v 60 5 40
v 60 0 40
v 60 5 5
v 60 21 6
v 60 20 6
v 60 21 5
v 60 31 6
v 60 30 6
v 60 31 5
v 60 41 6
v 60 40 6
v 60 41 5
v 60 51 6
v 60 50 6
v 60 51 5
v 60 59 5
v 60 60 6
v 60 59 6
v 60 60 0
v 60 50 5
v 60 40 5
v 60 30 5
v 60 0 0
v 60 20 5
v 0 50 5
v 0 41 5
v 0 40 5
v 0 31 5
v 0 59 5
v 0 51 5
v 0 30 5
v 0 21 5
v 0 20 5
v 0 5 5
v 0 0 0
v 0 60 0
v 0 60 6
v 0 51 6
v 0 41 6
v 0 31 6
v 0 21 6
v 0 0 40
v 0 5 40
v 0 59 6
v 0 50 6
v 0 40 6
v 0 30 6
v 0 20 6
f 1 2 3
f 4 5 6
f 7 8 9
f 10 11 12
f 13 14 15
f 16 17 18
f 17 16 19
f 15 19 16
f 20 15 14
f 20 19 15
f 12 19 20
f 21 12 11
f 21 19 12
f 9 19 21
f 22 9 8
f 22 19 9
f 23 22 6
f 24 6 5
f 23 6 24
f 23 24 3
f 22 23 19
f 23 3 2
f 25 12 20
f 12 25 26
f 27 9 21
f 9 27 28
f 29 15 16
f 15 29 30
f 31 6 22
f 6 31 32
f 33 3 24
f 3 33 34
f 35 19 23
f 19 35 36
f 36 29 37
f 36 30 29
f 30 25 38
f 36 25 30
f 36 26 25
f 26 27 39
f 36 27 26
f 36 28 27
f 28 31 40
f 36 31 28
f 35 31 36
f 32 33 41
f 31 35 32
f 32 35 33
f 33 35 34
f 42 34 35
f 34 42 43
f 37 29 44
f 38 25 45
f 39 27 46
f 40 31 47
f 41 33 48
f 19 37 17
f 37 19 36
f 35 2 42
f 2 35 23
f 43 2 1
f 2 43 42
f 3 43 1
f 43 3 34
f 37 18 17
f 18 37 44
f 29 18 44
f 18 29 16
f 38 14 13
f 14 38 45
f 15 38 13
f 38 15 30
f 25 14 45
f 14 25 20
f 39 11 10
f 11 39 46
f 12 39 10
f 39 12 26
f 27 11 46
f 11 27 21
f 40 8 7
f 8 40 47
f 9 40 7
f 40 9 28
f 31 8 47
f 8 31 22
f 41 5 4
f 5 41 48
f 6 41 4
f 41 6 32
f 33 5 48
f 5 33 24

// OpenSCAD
cube([60,60,5]);
cube([60,5,40]);
translate([0,59,5])cube([60,1,1]);
translate([0,50,5])cube([60,1,1]);
translate([0,40,5])cube([60,1,1]);
translate([0,30,5])cube([60,1,1]);
translate([0,20,5])cube([60,1,1]);
